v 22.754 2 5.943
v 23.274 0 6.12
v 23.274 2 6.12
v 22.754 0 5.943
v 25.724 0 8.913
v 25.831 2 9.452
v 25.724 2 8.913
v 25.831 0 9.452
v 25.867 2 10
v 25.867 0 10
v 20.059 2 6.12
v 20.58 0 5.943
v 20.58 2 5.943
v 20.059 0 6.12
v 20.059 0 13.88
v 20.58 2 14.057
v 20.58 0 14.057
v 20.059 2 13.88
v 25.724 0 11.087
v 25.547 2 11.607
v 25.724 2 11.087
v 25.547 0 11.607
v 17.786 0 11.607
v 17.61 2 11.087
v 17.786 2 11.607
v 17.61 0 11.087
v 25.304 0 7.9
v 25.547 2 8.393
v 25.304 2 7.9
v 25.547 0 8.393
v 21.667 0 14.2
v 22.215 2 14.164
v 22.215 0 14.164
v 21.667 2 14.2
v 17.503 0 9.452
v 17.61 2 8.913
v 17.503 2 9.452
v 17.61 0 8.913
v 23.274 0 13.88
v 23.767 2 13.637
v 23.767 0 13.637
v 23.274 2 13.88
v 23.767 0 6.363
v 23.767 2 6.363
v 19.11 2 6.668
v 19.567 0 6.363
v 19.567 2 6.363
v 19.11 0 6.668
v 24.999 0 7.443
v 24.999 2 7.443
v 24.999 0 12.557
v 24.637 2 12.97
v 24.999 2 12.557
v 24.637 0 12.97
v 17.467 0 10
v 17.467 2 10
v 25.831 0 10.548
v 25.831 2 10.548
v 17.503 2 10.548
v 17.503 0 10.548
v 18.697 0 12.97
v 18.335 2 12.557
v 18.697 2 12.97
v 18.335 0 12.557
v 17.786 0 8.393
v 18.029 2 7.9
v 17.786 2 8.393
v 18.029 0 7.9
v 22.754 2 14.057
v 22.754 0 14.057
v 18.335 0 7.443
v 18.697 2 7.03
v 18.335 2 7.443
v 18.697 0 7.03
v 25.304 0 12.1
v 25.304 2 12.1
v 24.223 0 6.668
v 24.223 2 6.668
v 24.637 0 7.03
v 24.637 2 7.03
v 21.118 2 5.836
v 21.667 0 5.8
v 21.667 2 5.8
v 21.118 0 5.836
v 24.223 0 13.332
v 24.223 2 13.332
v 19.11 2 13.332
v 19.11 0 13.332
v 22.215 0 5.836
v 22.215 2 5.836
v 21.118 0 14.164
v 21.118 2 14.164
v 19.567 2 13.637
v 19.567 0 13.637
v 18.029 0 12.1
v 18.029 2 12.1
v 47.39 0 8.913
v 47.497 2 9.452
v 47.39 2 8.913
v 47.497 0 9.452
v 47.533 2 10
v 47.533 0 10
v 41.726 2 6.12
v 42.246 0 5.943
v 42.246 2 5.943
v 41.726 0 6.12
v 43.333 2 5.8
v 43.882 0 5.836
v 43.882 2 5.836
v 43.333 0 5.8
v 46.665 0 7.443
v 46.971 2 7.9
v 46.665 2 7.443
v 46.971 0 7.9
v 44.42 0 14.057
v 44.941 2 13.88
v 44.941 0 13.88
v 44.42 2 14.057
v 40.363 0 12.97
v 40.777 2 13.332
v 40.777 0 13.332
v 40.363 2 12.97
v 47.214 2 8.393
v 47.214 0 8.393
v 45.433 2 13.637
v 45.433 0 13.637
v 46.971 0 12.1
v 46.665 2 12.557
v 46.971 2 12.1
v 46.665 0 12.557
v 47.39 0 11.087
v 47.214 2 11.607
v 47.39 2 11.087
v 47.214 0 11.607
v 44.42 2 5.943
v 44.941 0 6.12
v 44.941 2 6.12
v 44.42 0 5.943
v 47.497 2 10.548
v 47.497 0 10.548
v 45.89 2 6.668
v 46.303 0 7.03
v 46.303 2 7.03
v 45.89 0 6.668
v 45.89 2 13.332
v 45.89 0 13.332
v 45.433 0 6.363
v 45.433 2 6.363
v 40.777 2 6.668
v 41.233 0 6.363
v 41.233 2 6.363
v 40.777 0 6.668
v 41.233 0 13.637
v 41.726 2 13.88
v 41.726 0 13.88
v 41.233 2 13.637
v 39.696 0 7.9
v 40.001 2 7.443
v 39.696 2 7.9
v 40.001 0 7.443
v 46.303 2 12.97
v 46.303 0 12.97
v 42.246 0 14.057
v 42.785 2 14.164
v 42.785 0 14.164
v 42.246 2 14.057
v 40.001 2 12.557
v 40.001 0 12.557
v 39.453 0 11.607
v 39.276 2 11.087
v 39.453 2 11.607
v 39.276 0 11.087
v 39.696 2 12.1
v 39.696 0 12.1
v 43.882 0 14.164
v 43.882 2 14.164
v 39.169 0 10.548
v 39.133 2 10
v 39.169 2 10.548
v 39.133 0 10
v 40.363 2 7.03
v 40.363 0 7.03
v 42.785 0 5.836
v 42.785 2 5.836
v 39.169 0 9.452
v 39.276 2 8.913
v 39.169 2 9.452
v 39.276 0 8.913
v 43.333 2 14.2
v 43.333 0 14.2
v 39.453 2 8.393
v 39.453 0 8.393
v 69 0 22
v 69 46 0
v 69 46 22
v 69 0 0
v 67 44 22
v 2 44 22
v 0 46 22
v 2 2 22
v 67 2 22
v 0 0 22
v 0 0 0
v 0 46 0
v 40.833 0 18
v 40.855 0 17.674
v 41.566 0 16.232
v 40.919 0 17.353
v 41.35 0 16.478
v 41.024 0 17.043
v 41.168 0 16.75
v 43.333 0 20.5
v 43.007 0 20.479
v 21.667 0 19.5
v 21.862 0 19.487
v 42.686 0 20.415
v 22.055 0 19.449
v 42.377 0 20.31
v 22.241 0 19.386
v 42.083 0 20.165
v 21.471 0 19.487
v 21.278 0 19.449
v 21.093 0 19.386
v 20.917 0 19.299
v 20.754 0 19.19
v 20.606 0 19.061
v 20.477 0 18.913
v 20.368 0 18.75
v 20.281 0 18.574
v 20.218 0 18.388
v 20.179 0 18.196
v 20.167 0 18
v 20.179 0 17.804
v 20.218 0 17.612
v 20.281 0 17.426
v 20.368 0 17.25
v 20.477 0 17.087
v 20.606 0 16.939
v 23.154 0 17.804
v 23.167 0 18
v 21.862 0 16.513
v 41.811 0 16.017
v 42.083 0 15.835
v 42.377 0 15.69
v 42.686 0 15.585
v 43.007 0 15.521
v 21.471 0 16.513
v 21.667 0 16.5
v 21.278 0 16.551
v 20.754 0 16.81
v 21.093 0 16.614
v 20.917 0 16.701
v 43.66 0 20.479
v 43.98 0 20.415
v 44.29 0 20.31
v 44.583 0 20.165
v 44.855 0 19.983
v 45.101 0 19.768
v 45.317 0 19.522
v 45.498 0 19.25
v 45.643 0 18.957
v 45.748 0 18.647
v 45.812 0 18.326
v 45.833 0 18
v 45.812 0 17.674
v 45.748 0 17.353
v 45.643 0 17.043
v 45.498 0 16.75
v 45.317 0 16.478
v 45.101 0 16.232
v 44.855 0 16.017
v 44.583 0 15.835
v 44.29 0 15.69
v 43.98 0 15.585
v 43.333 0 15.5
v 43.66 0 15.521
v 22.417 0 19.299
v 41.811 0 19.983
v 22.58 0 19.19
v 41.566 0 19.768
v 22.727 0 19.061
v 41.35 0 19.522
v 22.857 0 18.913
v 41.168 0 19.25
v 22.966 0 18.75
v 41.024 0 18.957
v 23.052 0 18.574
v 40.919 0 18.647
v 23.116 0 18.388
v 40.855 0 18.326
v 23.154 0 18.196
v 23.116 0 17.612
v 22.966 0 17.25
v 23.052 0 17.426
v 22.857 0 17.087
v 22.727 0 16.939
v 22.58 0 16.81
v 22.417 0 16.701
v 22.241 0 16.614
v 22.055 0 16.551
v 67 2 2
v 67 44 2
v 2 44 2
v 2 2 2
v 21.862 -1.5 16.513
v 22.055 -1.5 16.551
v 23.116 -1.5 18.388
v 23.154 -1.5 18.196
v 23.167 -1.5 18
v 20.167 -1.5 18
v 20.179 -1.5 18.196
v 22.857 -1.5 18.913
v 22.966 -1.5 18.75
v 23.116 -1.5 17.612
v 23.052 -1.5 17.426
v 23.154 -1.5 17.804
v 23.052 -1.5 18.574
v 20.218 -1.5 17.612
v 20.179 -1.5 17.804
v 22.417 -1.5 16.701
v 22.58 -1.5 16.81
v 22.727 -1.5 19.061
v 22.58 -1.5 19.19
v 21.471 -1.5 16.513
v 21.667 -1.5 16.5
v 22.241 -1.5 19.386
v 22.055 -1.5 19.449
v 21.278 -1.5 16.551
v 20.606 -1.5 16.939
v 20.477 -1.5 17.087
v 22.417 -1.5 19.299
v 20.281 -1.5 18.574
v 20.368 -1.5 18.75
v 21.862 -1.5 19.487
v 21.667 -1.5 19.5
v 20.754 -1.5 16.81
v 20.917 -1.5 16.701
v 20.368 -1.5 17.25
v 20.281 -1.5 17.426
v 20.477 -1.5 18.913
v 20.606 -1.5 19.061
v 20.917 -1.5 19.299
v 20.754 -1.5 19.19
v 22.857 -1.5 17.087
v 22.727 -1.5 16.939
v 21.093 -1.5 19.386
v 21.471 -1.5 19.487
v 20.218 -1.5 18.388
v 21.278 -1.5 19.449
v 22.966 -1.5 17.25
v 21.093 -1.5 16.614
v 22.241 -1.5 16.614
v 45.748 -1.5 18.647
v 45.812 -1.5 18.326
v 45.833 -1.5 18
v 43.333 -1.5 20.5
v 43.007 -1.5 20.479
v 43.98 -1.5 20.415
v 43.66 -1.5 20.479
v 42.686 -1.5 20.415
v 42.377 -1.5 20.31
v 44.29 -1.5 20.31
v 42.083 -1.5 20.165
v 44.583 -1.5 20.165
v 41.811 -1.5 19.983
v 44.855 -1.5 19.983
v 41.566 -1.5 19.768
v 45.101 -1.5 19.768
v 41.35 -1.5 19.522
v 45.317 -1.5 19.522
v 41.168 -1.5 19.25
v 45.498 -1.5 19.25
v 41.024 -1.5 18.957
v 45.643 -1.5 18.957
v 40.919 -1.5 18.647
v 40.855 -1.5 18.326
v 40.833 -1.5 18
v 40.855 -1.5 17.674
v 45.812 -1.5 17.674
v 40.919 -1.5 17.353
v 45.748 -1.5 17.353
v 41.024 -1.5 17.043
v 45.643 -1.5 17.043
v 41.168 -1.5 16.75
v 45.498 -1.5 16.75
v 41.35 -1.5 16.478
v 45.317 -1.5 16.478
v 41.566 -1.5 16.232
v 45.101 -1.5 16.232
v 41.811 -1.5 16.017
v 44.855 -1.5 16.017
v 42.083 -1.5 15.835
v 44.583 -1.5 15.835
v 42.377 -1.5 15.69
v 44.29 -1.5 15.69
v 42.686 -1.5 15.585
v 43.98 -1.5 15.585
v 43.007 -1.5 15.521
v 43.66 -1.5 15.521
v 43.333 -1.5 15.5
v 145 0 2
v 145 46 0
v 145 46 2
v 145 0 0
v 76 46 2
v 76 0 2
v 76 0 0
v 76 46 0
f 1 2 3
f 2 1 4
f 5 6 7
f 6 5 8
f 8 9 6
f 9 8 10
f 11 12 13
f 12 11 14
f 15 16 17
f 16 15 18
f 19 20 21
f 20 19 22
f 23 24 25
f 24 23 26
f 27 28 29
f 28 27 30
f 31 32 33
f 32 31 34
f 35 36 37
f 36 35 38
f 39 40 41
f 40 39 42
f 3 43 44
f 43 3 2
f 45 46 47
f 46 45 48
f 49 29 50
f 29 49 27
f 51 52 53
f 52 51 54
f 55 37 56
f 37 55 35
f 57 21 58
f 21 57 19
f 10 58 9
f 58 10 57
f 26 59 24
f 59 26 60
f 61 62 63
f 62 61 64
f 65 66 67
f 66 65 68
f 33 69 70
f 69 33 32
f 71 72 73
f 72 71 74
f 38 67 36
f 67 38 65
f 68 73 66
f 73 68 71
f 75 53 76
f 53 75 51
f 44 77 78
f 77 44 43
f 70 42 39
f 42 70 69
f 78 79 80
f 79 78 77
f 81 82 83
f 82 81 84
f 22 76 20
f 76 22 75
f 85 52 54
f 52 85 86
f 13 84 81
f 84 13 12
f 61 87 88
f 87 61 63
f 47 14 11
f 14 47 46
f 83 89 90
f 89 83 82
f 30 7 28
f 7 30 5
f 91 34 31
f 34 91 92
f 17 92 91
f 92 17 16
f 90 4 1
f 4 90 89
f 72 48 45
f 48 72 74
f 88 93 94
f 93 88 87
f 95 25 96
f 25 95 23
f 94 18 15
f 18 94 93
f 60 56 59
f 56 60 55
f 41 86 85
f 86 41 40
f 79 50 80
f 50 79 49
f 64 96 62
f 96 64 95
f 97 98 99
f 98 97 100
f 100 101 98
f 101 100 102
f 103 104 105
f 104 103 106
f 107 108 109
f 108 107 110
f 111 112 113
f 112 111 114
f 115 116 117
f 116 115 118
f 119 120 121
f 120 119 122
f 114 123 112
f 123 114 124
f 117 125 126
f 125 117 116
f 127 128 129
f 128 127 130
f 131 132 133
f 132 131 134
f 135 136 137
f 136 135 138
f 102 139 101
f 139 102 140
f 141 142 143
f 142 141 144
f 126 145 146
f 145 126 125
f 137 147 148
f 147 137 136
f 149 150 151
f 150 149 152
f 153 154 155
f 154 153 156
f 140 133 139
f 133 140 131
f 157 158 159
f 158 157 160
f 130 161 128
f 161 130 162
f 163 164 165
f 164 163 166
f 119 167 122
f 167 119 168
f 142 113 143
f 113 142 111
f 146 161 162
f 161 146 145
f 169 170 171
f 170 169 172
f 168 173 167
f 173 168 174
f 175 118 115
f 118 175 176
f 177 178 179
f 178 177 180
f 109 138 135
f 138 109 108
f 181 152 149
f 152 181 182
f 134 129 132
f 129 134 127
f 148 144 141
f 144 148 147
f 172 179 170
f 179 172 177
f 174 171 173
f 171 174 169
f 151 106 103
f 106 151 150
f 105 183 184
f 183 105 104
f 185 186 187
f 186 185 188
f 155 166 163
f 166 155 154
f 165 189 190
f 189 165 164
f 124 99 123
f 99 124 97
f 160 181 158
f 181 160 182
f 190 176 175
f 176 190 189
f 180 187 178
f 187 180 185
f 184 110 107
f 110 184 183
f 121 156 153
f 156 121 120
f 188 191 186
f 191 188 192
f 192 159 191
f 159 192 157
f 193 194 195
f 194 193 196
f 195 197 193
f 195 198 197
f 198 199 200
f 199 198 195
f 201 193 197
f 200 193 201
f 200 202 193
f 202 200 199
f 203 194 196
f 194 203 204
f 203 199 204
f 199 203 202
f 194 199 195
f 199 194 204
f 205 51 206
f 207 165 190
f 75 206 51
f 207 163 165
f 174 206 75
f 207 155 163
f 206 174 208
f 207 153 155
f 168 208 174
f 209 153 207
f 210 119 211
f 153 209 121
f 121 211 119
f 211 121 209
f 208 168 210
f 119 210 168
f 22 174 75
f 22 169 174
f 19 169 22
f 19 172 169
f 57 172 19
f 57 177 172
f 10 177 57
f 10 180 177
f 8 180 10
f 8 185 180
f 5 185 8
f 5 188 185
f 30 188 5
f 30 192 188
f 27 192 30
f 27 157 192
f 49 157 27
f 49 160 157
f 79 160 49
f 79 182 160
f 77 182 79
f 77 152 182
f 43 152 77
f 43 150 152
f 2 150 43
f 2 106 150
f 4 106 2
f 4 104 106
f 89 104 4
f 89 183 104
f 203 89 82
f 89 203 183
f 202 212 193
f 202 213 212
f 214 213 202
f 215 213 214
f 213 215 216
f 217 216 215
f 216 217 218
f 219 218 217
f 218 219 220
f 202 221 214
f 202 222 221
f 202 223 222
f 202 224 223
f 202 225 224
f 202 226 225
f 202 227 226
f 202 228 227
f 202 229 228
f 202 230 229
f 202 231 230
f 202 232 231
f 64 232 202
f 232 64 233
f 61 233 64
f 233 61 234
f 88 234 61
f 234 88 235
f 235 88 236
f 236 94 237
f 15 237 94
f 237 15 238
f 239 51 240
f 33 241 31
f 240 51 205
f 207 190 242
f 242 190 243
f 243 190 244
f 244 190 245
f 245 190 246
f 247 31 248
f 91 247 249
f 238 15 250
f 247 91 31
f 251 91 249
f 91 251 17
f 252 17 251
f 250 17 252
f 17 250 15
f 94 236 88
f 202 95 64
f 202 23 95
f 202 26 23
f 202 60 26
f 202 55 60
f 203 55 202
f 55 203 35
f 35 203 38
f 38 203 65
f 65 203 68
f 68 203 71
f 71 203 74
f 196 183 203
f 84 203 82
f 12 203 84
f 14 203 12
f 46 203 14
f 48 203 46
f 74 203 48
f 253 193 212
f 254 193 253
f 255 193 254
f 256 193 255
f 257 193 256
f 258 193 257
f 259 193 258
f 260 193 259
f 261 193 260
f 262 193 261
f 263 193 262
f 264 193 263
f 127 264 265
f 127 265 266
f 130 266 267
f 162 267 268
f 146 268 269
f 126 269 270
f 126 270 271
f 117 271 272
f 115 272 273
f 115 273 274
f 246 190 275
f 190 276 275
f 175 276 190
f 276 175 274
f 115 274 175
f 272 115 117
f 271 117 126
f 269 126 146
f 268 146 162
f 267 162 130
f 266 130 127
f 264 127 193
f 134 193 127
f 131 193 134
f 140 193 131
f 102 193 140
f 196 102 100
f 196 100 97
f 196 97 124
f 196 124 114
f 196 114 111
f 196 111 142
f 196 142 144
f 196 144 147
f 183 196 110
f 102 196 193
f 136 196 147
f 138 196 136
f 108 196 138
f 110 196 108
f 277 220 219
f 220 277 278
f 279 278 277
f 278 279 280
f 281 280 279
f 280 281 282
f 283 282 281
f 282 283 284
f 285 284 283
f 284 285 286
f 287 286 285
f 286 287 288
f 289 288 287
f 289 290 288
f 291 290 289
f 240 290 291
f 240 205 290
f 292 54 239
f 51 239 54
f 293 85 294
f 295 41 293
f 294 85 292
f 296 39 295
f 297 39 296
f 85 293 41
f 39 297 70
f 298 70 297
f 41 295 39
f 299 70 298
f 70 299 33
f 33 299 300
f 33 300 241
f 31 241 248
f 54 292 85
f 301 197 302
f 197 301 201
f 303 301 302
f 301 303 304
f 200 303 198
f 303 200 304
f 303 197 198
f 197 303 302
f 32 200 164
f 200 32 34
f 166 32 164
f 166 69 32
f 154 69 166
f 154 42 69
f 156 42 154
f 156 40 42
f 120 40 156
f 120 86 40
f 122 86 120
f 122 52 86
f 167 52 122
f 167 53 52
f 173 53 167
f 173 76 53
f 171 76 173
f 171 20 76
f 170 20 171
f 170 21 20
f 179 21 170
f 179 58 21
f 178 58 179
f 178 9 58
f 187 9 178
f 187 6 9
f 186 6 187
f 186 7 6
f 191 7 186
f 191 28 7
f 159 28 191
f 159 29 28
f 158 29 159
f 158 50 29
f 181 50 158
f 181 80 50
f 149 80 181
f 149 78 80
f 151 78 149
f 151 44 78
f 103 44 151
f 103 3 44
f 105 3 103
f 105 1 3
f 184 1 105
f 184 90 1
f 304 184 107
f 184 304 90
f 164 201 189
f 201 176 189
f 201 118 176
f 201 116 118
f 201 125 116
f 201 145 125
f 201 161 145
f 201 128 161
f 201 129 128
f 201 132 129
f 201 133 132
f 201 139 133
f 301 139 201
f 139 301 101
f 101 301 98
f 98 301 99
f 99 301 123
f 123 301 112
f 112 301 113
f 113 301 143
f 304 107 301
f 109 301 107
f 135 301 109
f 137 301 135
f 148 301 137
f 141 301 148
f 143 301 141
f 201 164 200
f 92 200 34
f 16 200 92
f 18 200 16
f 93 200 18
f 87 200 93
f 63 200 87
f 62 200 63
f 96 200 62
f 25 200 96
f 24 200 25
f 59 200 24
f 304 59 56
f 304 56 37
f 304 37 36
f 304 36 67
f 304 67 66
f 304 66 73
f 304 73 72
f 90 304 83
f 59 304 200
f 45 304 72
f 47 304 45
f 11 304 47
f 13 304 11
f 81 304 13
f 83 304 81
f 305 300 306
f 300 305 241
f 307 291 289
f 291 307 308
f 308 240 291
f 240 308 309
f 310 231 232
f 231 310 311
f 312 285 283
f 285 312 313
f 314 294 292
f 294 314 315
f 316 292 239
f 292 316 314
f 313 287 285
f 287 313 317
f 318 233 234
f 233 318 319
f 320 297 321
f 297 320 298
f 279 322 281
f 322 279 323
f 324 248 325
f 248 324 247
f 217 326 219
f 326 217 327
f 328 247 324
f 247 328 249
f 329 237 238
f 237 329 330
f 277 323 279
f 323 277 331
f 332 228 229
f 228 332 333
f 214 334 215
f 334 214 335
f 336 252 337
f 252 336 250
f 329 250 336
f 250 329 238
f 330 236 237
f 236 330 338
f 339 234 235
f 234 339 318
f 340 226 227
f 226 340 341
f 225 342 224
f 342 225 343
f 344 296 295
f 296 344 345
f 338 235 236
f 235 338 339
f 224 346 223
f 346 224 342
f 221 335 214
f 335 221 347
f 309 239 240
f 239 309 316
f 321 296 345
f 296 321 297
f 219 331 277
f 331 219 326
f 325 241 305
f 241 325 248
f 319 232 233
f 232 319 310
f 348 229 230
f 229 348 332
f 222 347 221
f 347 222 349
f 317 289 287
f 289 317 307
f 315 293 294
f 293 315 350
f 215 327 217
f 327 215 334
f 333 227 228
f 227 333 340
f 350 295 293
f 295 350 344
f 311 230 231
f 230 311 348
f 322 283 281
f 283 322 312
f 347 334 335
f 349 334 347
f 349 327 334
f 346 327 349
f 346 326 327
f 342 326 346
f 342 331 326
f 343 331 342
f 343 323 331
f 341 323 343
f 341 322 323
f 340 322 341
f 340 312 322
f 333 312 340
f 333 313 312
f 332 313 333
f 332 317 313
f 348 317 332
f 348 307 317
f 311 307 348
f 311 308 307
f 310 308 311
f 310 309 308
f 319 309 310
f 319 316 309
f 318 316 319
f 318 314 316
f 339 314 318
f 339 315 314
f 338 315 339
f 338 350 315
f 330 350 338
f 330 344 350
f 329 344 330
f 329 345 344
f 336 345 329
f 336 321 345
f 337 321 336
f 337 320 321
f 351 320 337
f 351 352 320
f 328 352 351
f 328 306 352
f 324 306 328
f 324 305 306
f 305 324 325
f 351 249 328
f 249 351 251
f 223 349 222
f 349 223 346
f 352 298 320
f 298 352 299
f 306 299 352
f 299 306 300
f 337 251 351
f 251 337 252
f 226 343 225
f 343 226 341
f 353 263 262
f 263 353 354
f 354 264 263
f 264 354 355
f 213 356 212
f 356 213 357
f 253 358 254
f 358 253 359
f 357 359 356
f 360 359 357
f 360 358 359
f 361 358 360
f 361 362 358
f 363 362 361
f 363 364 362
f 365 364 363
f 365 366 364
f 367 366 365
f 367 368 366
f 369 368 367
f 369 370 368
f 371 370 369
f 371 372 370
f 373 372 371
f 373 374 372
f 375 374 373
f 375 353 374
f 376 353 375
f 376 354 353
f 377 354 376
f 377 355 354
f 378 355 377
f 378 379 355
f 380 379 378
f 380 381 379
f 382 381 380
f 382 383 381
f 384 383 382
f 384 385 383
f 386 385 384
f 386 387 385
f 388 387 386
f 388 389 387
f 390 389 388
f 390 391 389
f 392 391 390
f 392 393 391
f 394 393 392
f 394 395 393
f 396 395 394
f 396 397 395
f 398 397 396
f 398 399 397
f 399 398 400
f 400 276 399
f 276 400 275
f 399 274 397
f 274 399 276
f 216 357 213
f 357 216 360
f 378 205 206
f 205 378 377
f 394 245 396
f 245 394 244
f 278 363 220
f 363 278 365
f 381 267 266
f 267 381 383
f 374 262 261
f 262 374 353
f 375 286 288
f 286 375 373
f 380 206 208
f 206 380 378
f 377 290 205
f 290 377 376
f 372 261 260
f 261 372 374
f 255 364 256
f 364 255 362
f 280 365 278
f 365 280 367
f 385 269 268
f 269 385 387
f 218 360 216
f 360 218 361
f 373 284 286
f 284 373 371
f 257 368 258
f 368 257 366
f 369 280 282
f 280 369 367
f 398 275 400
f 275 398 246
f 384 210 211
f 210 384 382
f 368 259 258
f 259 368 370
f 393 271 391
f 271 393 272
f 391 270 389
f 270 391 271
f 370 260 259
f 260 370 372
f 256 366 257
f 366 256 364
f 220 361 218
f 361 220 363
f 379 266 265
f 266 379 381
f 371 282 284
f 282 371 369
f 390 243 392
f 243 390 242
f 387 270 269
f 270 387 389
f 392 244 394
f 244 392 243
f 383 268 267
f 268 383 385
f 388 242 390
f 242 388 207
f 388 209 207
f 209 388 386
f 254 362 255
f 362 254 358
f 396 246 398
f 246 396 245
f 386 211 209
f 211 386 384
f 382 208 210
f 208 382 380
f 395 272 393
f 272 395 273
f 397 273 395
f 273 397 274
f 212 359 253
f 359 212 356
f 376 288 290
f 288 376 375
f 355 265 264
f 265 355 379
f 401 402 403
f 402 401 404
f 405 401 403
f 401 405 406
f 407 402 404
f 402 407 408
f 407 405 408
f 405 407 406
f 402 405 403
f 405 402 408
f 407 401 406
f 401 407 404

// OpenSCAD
// SPDX-License-Identifier: AGPL-3.0-only
// Parametric fit-test concept; dimensions are assumptions, not a verified PCB fit.
inner_x = 65;
inner_y = 42;
inner_z = 20;
wall = 2;
clearance = 0.4;
button_diameter = 8;
$fn = 48;
assert(inner_x > 30 && inner_y > 25 && inner_z > 8 && wall >= 1);
// Open tray. Rounded tactile guards distinguish the two placeholder button holes.
difference() {
    cube([inner_x + 2*wall, inner_y + 2*wall, inner_z + wall]);
    translate([wall, wall, wall]) cube([inner_x, inner_y, inner_z + 1]);
    for (x = [inner_x/3, 2*inner_x/3])
        translate([x, -1, inner_z/2]) rotate([-90, 0, 0])
            cylinder(h=wall+2, d=button_diameter+clearance);
}
for (x = [inner_x/3, 2*inner_x/3])
    translate([x, 0, inner_z/2 + button_diameter]) rotate([90, 0, 0])
        cylinder(h=1.5, d=(x < inner_x/2 ? 3 : 5));
// Separate flat lid for fit tests; fastening, antenna keepout, battery safety and
// ingress/thermal/drop testing remain engineering work.
translate([inner_x + 3*wall + 5, 0, 0])
    cube([inner_x + 2*wall, inner_y + 2*wall, wall]);
